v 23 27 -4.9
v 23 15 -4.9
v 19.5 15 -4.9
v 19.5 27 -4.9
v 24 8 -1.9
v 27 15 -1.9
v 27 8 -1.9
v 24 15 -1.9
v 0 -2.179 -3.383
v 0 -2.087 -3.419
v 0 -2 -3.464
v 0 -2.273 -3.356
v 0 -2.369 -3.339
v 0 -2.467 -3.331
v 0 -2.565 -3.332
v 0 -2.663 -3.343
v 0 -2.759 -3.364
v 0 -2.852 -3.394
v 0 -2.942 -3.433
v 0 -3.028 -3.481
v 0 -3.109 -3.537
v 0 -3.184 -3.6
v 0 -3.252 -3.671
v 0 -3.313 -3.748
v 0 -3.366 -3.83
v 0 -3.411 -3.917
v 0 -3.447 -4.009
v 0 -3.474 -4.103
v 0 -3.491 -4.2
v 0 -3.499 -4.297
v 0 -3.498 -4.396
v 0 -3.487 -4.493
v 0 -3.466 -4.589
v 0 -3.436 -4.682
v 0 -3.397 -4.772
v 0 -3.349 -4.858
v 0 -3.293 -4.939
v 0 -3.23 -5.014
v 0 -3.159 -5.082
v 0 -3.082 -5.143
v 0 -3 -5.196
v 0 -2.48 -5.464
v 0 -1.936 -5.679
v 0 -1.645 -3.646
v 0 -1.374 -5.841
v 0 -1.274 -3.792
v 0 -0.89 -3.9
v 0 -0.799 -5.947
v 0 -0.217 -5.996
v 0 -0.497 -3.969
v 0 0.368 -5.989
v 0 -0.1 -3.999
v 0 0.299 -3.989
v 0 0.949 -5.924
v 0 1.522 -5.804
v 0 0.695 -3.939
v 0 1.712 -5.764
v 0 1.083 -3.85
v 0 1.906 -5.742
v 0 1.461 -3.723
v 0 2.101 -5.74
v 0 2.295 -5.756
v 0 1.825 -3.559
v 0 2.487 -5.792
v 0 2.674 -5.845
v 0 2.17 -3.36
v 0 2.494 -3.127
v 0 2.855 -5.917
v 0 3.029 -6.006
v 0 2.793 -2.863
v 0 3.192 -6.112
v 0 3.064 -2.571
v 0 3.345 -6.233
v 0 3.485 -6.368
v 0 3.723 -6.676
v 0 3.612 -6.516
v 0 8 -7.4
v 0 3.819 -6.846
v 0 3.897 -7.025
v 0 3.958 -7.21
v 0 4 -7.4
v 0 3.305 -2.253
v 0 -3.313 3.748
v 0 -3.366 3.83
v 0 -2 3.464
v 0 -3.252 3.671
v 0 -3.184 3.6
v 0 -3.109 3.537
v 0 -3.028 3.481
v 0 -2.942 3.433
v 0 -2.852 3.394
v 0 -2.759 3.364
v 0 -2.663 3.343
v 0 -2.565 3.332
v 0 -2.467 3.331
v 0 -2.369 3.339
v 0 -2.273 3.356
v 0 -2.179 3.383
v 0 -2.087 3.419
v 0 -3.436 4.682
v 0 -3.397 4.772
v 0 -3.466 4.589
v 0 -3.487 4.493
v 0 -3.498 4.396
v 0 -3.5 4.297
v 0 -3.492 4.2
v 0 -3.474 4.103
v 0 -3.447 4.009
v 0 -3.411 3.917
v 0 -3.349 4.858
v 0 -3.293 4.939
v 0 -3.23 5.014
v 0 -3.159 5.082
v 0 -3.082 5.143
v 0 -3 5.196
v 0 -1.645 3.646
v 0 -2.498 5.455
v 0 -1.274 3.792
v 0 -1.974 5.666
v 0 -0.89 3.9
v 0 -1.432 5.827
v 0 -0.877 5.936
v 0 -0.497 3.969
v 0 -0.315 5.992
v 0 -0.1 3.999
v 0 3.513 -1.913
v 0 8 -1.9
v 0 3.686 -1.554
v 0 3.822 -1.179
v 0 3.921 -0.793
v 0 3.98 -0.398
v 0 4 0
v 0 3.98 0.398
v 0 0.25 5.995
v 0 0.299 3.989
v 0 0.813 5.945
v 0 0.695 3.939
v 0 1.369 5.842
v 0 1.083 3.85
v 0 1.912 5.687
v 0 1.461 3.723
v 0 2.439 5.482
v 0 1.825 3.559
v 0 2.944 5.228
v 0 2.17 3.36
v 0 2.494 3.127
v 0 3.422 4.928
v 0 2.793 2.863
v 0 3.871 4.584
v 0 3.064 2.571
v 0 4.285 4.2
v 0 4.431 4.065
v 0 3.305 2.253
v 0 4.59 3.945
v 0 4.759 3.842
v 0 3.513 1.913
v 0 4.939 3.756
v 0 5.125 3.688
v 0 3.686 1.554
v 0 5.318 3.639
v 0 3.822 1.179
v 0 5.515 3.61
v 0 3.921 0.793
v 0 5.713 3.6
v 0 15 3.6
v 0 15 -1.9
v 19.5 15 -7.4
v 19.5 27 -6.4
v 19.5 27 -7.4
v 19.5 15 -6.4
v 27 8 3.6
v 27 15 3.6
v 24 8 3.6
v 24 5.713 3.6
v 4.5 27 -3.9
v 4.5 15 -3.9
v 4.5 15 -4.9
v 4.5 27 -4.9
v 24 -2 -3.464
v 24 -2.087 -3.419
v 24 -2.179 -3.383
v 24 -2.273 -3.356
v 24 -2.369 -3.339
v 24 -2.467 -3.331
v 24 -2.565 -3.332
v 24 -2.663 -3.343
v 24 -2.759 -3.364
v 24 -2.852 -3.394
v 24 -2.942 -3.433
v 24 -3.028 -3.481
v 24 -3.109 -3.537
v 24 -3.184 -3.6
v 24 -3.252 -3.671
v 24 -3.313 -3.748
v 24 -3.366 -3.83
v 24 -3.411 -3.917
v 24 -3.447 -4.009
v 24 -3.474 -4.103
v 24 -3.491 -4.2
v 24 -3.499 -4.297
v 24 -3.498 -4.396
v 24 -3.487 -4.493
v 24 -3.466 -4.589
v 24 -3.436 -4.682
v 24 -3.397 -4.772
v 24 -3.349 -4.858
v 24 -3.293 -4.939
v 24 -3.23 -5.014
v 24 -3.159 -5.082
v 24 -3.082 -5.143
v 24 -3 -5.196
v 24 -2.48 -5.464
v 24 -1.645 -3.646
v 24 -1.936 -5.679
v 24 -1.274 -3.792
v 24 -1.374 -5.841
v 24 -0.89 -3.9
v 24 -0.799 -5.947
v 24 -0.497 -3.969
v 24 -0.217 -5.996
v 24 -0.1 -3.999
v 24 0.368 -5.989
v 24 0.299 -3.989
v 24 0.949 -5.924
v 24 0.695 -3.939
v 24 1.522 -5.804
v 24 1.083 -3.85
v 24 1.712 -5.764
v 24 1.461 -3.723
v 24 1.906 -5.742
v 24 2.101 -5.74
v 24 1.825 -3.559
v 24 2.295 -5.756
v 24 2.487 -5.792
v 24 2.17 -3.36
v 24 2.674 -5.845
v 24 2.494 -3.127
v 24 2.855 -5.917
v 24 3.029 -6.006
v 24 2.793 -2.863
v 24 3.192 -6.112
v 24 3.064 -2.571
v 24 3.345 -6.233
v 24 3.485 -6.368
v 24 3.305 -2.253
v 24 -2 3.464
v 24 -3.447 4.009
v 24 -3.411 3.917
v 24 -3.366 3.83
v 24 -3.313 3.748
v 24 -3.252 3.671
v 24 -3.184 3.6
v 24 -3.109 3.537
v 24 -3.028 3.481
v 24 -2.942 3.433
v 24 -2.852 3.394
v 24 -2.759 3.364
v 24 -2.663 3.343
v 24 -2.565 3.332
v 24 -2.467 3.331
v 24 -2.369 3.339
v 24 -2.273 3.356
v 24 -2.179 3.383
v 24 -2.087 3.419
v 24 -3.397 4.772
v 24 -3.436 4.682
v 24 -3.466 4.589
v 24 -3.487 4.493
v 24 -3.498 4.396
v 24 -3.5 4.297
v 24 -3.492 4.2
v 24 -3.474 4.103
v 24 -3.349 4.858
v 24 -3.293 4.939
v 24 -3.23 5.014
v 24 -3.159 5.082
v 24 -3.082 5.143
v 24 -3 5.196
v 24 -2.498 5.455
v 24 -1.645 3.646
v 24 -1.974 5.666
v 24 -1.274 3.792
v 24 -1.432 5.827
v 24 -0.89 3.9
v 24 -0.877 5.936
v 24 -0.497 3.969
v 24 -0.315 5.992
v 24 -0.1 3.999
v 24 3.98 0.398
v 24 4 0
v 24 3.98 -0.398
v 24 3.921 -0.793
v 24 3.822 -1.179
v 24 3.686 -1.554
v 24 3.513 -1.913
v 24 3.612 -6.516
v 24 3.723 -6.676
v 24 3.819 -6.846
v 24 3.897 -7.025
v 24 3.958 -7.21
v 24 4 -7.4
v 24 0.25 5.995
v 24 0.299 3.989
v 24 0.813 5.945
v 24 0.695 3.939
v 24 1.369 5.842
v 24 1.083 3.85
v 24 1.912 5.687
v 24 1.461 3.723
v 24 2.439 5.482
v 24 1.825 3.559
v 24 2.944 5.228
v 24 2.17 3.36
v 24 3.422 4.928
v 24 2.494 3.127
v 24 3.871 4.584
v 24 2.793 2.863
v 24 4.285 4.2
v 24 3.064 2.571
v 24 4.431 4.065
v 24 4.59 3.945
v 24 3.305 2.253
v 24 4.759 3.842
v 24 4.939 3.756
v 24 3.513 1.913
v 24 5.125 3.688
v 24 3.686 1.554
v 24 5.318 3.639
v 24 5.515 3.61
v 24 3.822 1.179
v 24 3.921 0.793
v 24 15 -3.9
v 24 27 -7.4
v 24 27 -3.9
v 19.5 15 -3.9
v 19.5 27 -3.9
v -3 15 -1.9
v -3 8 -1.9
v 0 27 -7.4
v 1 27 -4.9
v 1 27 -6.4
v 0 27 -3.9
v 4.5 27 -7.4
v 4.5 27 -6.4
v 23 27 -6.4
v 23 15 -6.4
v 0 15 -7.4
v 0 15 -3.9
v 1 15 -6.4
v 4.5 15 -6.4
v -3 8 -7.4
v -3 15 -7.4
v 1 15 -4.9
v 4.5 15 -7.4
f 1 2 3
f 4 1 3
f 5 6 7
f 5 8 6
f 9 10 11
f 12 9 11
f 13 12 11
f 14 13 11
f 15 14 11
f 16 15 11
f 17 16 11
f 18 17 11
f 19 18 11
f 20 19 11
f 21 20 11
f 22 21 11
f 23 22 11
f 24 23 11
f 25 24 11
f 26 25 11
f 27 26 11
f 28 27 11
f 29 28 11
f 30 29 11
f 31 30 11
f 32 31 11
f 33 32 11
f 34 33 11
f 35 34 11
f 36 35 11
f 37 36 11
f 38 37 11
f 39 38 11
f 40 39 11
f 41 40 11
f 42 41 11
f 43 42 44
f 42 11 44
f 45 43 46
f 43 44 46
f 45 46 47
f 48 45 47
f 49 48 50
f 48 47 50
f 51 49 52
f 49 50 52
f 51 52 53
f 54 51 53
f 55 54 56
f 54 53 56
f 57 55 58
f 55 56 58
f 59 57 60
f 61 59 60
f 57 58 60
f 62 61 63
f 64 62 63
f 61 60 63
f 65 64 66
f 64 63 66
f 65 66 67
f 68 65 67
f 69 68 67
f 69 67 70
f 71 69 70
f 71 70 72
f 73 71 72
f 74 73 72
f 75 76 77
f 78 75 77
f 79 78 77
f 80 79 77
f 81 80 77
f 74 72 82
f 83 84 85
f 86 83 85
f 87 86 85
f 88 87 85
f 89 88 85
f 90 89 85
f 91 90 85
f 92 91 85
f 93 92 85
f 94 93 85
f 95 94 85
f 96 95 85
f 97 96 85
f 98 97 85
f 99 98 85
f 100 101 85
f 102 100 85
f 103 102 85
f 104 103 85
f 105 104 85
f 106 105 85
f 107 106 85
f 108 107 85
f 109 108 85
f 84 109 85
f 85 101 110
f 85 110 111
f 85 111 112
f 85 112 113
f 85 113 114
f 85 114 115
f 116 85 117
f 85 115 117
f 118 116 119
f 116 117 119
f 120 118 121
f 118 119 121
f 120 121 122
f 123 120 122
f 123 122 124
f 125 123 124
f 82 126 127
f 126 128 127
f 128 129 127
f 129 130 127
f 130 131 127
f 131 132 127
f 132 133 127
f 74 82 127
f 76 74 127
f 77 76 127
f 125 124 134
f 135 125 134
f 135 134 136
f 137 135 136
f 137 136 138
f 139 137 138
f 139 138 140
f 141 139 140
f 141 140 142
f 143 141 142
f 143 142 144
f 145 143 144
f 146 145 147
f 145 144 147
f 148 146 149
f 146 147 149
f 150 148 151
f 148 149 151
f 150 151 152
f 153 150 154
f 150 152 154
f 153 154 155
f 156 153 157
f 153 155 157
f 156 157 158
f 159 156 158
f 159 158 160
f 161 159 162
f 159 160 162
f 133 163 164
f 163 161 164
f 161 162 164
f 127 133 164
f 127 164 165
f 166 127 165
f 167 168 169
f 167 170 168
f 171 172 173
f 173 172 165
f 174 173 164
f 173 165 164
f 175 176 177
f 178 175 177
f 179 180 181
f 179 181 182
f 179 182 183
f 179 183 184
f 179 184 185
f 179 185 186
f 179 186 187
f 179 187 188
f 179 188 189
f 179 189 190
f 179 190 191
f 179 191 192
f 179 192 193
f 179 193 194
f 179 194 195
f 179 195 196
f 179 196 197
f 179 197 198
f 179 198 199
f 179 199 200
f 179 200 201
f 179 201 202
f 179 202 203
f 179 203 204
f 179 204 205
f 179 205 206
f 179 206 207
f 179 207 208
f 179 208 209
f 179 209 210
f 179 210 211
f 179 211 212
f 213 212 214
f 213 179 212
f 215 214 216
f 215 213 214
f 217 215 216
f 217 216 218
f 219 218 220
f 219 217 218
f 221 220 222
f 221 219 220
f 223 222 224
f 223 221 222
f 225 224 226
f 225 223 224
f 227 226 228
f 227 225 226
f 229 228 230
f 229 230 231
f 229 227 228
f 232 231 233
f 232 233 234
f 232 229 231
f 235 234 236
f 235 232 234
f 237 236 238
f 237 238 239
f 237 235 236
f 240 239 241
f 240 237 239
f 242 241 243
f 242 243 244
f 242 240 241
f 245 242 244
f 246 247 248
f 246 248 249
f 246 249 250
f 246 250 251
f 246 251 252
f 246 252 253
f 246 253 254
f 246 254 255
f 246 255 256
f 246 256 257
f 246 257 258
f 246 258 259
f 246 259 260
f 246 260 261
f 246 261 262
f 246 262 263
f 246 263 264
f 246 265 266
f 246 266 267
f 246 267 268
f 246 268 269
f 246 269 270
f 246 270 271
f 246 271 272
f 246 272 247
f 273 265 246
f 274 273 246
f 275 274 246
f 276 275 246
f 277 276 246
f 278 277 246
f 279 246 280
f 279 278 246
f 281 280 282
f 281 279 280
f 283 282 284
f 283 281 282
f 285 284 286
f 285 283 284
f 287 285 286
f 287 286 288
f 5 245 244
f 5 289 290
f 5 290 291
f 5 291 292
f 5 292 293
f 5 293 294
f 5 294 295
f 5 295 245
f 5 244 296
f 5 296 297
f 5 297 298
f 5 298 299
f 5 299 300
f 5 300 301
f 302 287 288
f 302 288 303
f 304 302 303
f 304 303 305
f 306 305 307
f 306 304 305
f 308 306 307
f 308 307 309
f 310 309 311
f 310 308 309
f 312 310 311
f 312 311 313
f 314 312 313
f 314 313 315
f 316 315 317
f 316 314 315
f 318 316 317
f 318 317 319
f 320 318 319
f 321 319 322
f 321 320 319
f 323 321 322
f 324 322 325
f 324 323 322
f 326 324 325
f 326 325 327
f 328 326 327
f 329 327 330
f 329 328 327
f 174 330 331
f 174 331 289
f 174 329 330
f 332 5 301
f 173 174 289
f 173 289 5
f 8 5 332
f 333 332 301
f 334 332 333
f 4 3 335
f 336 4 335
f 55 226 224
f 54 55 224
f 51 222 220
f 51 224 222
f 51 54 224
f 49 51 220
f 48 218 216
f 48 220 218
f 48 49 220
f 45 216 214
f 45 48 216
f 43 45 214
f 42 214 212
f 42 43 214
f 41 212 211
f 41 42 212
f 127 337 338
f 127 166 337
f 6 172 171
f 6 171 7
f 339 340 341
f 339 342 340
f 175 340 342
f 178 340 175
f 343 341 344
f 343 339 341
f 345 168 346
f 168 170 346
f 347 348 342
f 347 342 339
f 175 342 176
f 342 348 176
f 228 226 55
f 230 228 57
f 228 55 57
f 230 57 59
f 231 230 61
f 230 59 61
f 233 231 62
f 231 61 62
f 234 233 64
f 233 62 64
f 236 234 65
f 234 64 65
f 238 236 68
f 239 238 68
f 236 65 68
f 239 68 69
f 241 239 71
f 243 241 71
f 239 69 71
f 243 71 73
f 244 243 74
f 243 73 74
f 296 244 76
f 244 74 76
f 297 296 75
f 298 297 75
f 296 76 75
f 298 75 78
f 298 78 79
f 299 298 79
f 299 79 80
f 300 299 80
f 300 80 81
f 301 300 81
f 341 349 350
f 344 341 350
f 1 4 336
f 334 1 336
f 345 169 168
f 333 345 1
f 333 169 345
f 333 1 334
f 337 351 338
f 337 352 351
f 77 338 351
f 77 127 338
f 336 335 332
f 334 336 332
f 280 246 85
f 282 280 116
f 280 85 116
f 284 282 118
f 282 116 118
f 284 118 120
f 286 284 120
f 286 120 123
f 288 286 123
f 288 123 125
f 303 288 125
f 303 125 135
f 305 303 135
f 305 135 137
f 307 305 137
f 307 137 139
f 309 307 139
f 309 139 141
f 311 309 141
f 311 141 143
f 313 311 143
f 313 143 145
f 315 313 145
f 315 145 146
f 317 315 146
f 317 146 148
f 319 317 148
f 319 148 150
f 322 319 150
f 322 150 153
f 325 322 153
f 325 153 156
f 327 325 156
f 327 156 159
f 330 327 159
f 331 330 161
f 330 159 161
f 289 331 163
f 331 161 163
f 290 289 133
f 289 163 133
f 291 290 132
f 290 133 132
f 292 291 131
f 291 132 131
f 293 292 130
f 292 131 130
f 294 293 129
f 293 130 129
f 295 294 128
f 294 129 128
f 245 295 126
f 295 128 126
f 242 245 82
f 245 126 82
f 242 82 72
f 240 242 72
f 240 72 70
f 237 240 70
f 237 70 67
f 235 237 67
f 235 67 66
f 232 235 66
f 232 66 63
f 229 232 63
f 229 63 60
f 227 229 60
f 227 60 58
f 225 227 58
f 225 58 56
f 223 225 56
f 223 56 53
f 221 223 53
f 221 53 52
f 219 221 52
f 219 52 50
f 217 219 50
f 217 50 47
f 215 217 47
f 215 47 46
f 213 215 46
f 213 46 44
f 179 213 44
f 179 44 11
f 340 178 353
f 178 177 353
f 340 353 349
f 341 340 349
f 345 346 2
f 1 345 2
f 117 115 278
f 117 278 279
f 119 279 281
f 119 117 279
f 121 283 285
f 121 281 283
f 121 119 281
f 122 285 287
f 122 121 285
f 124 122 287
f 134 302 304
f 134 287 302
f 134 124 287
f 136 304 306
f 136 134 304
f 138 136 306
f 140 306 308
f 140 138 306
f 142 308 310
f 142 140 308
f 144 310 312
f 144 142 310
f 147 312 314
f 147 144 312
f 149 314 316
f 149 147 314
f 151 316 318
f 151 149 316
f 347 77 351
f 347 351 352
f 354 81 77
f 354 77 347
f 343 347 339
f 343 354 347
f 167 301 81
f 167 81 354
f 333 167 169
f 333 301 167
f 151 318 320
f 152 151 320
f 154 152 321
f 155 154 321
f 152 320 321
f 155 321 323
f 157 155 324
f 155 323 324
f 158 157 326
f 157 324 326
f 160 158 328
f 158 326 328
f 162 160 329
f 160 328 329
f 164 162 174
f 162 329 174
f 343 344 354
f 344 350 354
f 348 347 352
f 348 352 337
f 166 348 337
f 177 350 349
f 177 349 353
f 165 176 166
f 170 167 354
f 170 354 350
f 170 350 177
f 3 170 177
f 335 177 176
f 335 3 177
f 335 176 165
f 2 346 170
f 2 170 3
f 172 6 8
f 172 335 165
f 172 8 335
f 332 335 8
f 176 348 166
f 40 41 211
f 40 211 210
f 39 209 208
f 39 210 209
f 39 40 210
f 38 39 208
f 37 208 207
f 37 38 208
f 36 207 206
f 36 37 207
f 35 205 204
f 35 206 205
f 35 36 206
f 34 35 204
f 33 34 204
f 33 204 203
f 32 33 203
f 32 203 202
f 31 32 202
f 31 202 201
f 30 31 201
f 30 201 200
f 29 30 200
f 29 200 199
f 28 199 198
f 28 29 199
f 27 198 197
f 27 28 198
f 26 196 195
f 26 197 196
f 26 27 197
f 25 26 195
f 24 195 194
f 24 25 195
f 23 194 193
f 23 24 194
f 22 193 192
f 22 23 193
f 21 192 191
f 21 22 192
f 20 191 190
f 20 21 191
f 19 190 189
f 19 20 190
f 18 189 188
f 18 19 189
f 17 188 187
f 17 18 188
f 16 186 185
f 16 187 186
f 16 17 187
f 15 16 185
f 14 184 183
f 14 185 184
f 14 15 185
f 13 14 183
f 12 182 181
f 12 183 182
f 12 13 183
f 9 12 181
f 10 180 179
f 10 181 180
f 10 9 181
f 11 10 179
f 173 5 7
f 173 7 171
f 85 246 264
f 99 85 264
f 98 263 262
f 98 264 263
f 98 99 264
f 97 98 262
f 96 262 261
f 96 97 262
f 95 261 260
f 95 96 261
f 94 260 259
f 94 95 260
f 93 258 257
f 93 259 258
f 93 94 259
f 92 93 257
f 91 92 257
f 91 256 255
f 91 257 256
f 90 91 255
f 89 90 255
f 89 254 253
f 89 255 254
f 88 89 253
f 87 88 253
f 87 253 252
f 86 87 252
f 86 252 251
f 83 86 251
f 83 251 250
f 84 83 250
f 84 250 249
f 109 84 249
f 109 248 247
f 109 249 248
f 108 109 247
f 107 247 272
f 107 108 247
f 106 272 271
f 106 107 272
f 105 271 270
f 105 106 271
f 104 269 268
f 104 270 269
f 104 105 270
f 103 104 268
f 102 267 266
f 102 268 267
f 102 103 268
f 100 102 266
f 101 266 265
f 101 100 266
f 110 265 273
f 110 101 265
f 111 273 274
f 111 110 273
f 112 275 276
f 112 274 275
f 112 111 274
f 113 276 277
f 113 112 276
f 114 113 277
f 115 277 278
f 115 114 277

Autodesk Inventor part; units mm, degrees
ref_plane "YZ Plane" through (0, 0, 0) normal (1, 0, 0) x (0, 1, 0)
ref_plane "XZ Plane" through (0, 0, 0) normal (0, 1, 0) x (-1, 0, 0)
ref_plane "XY Plane" through (0, 0, 0) normal (0, 0, 1) x (1, 0, 0)
sketch "Sketch1" plane through (0, 0, 0) normal (1, 0, 0) x (0, 1, 0)
  circle A0 centre (0, 0) radius 4
  arc A1 (-3, -5.1962) -> (-3, 5.1962) centre (0, 0) ccw
  arc A2 (-3, 5.1962) -> (-2, 3.4641) centre (-2.5, 4.3301) ccw
  arc A3 (-2, -3.4641) -> (-3, -5.1962) centre (-2.5, -4.3301) ccw
  line L0 (15, 3.6) -> (4, 3.6)
  line L1 (4, 3.6) -> (4, -7.4)
  line L2 (4, -7.4) -> (15, -7.4)
  line L3 (15, -7.4) -> (15, 3.6)
  dimension "d0" = 8
  dimension "d1" = 12
  dimension "d2" = 2.5
  dimension "d4" = 11
  dimension "d5" = 11
  dimension "d6" = 4
  dimension "d9" = 7.4
extrude "Extrusion1" add sketch "Sketch1" along normal blind 24 contours L1 A1 A3 A0 | A0 A2 A1 L0 L1 | L1 L0 A1 | A1 L0 L3 L2 L1
fillet "Fillet1" radius 2 1 edges at (12, 4, -4.4721)
fillet "Fillet2" radius 2 1 edges at (12, 4.8, 3.6)
ref_plane "Work Plane1" through (0, 4.8, -6.4) normal (0, 0, 1) x (1, 0, 0)
sketch "Sketch5" plane through (24, 0, 0) normal (1, 0, 0) x (0, 0, -1)
  line L0 (-3.6, 15) -> (-3.6, 5.7131) projected
  line L1 (-3.6, 15) -> (1.9, 15)
  line L2 (1.9, 15) -> (1.9, 8)
  line L3 (1.9, 8) -> (-3.6, 8)
  line L4 (-3.6, 8) -> (-3.6, 15)
  point P0 (0, 0)
  dimension "d31" = 5.5
  dimension "d32" = 7
extrude "Extrusion5" add sketch "Sketch5" along normal blind 3
sketch "Sketch6" plane through (0, 0, 0) normal (-1, 0, 0) x (0, 0, 1)
  line L0 (-7.4, 4) -> (-7.4, 15) projected
  line L1 (-7.4, 15) -> (-1.9, 15)
  line L2 (-1.9, 15) -> (-1.9, 8)
  line L3 (-1.9, 8) -> (-7.4, 8)
  line L4 (-7.4, 8) -> (-7.4, 15)
  point P0 (0, 0)
  point P1 (-8, 4)
  dimension "d35" = 7
  dimension "d36" = 5.5
extrude "Extrusion6" add sketch "Sketch6" along normal blind 3
sketch "Sketch11" plane through (0, 15, 3.6) normal (0, 1, 0) x (1, 0, 0)
  line L0 (0, 11) -> (24, 11) projected
  line L1 (0, 5.5) -> (0, 11) projected
  line L2 (0, 11) -> (0, 7.5)
  line L3 (24, 7.5) -> (24, 11)
  line L4 (1, 8.5) -> (1, 10)
  line L5 (23, 10) -> (23, 8.5)
  line L6 (19.5, 8.5) -> (19.5, 7.5)
  line L7 (19.5, 10) -> (19.5, 11)
  line L8 (-3, 11) -> (24, 11) projected
  line L9 (4.5, 7.5) -> (4.5, 8.5)
  line L10 (4.5, 10) -> (4.5, 11)
  line L11 (19.5, 10) -> (19.5, 11)
  line L12 (18.3, 11) -> (21.5, 11) projected
  line L13 (1, 10) -> (4.5, 10)
  line L14 (19.5, 10) -> (23, 10)
  line L15 (24, 11) -> (19.5, 11)
  line L16 (4.5, 11) -> (0, 11)
  line L17 (23, 8.5) -> (19.5, 8.5)
  line L18 (4.5, 8.5) -> (1, 8.5)
  line L19 (0, 7.5) -> (4.5, 7.5)
  line L20 (19.5, 7.5) -> (24, 7.5)
  point P0 (0, 3.6)
  point P1 (23, 9.25)
  point P2 (24, 9.4038)
  point P3 (24, 9.25)
  point P4 (1, 9.25)
  point P5 (21.75, 7.5)
  point P6 (2.25, 7.5)
  point P7 (2.75, 8.5)
  point P8 (21.25, 8.5)
  point P9 (21.25, 10)
  point P10 (2.75, 10)
  point P11 (21.75, 11)
  point P12 (2.25, 11)
  dimension "d62" = 1.5
  dimension "d63" = 1
  dimension "d64" = 15
  dimension "d70" = 4.5
  dimension "d71" = 3.5
  dimension "d72" = 1
extrude "Extrusion10" add sketch "Sketch11" along normal blind 12
properties part number "Roller_Switch end"
